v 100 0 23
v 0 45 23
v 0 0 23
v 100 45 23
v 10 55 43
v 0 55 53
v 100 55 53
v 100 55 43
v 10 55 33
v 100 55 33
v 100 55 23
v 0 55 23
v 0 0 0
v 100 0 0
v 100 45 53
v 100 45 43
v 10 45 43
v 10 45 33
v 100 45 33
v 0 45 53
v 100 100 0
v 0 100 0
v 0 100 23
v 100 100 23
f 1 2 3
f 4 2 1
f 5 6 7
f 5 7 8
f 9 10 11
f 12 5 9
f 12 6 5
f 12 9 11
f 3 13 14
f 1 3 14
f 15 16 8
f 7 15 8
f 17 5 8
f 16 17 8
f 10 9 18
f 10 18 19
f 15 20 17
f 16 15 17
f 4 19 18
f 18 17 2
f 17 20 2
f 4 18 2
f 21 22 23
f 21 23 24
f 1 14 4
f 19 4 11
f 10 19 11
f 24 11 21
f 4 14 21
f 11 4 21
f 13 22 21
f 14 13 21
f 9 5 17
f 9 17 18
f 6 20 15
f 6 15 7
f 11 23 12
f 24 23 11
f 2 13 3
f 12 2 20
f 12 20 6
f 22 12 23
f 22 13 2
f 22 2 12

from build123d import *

# Parameters (mm, degrees)
SKETCH1_W           = 100
SKETCH1_H           = 100
BOSS_EXTRUDE1_DEPTH = 23
SKETCH17_W          = 30
SKETCH17_H          = 10
BOSS_EXTRUDE2_DEPTH = 100
SKETCH18_W          = 90
SKETCH18_H          = 10
CUT_EXTRUDE1_DEPTH  = 126.833222958


with BuildPart() as part:
    # Sketch1 → Boss-Extrude1 (new body)
    with BuildSketch(Plane.XY):
        with Locations((50, 50)):
            Rectangle(SKETCH1_W, SKETCH1_H)
    extrude(amount=BOSS_EXTRUDE1_DEPTH)

    # Sketch17 → Boss-Extrude2 (add, through all)
    with BuildSketch(Plane(origin=(0, 0, 0), x_dir=(0, 0, -1), z_dir=(1, 0, 0))):
        with Locations((-38, 50)):
            Rectangle(SKETCH17_W, SKETCH17_H)
    extrude(amount=BOSS_EXTRUDE2_DEPTH)

    # Sketch18 → Cut-Extrude1 (cut, through all)
    with BuildSketch(Plane(origin=(0, 55, 0), x_dir=(1, 0, 0), z_dir=(0, 1, 0))):
        with Locations((55, -38)):
            Rectangle(SKETCH18_W, SKETCH18_H)
    extrude(amount=-CUT_EXTRUDE1_DEPTH, mode=Mode.SUBTRACT)


solid = part.part
